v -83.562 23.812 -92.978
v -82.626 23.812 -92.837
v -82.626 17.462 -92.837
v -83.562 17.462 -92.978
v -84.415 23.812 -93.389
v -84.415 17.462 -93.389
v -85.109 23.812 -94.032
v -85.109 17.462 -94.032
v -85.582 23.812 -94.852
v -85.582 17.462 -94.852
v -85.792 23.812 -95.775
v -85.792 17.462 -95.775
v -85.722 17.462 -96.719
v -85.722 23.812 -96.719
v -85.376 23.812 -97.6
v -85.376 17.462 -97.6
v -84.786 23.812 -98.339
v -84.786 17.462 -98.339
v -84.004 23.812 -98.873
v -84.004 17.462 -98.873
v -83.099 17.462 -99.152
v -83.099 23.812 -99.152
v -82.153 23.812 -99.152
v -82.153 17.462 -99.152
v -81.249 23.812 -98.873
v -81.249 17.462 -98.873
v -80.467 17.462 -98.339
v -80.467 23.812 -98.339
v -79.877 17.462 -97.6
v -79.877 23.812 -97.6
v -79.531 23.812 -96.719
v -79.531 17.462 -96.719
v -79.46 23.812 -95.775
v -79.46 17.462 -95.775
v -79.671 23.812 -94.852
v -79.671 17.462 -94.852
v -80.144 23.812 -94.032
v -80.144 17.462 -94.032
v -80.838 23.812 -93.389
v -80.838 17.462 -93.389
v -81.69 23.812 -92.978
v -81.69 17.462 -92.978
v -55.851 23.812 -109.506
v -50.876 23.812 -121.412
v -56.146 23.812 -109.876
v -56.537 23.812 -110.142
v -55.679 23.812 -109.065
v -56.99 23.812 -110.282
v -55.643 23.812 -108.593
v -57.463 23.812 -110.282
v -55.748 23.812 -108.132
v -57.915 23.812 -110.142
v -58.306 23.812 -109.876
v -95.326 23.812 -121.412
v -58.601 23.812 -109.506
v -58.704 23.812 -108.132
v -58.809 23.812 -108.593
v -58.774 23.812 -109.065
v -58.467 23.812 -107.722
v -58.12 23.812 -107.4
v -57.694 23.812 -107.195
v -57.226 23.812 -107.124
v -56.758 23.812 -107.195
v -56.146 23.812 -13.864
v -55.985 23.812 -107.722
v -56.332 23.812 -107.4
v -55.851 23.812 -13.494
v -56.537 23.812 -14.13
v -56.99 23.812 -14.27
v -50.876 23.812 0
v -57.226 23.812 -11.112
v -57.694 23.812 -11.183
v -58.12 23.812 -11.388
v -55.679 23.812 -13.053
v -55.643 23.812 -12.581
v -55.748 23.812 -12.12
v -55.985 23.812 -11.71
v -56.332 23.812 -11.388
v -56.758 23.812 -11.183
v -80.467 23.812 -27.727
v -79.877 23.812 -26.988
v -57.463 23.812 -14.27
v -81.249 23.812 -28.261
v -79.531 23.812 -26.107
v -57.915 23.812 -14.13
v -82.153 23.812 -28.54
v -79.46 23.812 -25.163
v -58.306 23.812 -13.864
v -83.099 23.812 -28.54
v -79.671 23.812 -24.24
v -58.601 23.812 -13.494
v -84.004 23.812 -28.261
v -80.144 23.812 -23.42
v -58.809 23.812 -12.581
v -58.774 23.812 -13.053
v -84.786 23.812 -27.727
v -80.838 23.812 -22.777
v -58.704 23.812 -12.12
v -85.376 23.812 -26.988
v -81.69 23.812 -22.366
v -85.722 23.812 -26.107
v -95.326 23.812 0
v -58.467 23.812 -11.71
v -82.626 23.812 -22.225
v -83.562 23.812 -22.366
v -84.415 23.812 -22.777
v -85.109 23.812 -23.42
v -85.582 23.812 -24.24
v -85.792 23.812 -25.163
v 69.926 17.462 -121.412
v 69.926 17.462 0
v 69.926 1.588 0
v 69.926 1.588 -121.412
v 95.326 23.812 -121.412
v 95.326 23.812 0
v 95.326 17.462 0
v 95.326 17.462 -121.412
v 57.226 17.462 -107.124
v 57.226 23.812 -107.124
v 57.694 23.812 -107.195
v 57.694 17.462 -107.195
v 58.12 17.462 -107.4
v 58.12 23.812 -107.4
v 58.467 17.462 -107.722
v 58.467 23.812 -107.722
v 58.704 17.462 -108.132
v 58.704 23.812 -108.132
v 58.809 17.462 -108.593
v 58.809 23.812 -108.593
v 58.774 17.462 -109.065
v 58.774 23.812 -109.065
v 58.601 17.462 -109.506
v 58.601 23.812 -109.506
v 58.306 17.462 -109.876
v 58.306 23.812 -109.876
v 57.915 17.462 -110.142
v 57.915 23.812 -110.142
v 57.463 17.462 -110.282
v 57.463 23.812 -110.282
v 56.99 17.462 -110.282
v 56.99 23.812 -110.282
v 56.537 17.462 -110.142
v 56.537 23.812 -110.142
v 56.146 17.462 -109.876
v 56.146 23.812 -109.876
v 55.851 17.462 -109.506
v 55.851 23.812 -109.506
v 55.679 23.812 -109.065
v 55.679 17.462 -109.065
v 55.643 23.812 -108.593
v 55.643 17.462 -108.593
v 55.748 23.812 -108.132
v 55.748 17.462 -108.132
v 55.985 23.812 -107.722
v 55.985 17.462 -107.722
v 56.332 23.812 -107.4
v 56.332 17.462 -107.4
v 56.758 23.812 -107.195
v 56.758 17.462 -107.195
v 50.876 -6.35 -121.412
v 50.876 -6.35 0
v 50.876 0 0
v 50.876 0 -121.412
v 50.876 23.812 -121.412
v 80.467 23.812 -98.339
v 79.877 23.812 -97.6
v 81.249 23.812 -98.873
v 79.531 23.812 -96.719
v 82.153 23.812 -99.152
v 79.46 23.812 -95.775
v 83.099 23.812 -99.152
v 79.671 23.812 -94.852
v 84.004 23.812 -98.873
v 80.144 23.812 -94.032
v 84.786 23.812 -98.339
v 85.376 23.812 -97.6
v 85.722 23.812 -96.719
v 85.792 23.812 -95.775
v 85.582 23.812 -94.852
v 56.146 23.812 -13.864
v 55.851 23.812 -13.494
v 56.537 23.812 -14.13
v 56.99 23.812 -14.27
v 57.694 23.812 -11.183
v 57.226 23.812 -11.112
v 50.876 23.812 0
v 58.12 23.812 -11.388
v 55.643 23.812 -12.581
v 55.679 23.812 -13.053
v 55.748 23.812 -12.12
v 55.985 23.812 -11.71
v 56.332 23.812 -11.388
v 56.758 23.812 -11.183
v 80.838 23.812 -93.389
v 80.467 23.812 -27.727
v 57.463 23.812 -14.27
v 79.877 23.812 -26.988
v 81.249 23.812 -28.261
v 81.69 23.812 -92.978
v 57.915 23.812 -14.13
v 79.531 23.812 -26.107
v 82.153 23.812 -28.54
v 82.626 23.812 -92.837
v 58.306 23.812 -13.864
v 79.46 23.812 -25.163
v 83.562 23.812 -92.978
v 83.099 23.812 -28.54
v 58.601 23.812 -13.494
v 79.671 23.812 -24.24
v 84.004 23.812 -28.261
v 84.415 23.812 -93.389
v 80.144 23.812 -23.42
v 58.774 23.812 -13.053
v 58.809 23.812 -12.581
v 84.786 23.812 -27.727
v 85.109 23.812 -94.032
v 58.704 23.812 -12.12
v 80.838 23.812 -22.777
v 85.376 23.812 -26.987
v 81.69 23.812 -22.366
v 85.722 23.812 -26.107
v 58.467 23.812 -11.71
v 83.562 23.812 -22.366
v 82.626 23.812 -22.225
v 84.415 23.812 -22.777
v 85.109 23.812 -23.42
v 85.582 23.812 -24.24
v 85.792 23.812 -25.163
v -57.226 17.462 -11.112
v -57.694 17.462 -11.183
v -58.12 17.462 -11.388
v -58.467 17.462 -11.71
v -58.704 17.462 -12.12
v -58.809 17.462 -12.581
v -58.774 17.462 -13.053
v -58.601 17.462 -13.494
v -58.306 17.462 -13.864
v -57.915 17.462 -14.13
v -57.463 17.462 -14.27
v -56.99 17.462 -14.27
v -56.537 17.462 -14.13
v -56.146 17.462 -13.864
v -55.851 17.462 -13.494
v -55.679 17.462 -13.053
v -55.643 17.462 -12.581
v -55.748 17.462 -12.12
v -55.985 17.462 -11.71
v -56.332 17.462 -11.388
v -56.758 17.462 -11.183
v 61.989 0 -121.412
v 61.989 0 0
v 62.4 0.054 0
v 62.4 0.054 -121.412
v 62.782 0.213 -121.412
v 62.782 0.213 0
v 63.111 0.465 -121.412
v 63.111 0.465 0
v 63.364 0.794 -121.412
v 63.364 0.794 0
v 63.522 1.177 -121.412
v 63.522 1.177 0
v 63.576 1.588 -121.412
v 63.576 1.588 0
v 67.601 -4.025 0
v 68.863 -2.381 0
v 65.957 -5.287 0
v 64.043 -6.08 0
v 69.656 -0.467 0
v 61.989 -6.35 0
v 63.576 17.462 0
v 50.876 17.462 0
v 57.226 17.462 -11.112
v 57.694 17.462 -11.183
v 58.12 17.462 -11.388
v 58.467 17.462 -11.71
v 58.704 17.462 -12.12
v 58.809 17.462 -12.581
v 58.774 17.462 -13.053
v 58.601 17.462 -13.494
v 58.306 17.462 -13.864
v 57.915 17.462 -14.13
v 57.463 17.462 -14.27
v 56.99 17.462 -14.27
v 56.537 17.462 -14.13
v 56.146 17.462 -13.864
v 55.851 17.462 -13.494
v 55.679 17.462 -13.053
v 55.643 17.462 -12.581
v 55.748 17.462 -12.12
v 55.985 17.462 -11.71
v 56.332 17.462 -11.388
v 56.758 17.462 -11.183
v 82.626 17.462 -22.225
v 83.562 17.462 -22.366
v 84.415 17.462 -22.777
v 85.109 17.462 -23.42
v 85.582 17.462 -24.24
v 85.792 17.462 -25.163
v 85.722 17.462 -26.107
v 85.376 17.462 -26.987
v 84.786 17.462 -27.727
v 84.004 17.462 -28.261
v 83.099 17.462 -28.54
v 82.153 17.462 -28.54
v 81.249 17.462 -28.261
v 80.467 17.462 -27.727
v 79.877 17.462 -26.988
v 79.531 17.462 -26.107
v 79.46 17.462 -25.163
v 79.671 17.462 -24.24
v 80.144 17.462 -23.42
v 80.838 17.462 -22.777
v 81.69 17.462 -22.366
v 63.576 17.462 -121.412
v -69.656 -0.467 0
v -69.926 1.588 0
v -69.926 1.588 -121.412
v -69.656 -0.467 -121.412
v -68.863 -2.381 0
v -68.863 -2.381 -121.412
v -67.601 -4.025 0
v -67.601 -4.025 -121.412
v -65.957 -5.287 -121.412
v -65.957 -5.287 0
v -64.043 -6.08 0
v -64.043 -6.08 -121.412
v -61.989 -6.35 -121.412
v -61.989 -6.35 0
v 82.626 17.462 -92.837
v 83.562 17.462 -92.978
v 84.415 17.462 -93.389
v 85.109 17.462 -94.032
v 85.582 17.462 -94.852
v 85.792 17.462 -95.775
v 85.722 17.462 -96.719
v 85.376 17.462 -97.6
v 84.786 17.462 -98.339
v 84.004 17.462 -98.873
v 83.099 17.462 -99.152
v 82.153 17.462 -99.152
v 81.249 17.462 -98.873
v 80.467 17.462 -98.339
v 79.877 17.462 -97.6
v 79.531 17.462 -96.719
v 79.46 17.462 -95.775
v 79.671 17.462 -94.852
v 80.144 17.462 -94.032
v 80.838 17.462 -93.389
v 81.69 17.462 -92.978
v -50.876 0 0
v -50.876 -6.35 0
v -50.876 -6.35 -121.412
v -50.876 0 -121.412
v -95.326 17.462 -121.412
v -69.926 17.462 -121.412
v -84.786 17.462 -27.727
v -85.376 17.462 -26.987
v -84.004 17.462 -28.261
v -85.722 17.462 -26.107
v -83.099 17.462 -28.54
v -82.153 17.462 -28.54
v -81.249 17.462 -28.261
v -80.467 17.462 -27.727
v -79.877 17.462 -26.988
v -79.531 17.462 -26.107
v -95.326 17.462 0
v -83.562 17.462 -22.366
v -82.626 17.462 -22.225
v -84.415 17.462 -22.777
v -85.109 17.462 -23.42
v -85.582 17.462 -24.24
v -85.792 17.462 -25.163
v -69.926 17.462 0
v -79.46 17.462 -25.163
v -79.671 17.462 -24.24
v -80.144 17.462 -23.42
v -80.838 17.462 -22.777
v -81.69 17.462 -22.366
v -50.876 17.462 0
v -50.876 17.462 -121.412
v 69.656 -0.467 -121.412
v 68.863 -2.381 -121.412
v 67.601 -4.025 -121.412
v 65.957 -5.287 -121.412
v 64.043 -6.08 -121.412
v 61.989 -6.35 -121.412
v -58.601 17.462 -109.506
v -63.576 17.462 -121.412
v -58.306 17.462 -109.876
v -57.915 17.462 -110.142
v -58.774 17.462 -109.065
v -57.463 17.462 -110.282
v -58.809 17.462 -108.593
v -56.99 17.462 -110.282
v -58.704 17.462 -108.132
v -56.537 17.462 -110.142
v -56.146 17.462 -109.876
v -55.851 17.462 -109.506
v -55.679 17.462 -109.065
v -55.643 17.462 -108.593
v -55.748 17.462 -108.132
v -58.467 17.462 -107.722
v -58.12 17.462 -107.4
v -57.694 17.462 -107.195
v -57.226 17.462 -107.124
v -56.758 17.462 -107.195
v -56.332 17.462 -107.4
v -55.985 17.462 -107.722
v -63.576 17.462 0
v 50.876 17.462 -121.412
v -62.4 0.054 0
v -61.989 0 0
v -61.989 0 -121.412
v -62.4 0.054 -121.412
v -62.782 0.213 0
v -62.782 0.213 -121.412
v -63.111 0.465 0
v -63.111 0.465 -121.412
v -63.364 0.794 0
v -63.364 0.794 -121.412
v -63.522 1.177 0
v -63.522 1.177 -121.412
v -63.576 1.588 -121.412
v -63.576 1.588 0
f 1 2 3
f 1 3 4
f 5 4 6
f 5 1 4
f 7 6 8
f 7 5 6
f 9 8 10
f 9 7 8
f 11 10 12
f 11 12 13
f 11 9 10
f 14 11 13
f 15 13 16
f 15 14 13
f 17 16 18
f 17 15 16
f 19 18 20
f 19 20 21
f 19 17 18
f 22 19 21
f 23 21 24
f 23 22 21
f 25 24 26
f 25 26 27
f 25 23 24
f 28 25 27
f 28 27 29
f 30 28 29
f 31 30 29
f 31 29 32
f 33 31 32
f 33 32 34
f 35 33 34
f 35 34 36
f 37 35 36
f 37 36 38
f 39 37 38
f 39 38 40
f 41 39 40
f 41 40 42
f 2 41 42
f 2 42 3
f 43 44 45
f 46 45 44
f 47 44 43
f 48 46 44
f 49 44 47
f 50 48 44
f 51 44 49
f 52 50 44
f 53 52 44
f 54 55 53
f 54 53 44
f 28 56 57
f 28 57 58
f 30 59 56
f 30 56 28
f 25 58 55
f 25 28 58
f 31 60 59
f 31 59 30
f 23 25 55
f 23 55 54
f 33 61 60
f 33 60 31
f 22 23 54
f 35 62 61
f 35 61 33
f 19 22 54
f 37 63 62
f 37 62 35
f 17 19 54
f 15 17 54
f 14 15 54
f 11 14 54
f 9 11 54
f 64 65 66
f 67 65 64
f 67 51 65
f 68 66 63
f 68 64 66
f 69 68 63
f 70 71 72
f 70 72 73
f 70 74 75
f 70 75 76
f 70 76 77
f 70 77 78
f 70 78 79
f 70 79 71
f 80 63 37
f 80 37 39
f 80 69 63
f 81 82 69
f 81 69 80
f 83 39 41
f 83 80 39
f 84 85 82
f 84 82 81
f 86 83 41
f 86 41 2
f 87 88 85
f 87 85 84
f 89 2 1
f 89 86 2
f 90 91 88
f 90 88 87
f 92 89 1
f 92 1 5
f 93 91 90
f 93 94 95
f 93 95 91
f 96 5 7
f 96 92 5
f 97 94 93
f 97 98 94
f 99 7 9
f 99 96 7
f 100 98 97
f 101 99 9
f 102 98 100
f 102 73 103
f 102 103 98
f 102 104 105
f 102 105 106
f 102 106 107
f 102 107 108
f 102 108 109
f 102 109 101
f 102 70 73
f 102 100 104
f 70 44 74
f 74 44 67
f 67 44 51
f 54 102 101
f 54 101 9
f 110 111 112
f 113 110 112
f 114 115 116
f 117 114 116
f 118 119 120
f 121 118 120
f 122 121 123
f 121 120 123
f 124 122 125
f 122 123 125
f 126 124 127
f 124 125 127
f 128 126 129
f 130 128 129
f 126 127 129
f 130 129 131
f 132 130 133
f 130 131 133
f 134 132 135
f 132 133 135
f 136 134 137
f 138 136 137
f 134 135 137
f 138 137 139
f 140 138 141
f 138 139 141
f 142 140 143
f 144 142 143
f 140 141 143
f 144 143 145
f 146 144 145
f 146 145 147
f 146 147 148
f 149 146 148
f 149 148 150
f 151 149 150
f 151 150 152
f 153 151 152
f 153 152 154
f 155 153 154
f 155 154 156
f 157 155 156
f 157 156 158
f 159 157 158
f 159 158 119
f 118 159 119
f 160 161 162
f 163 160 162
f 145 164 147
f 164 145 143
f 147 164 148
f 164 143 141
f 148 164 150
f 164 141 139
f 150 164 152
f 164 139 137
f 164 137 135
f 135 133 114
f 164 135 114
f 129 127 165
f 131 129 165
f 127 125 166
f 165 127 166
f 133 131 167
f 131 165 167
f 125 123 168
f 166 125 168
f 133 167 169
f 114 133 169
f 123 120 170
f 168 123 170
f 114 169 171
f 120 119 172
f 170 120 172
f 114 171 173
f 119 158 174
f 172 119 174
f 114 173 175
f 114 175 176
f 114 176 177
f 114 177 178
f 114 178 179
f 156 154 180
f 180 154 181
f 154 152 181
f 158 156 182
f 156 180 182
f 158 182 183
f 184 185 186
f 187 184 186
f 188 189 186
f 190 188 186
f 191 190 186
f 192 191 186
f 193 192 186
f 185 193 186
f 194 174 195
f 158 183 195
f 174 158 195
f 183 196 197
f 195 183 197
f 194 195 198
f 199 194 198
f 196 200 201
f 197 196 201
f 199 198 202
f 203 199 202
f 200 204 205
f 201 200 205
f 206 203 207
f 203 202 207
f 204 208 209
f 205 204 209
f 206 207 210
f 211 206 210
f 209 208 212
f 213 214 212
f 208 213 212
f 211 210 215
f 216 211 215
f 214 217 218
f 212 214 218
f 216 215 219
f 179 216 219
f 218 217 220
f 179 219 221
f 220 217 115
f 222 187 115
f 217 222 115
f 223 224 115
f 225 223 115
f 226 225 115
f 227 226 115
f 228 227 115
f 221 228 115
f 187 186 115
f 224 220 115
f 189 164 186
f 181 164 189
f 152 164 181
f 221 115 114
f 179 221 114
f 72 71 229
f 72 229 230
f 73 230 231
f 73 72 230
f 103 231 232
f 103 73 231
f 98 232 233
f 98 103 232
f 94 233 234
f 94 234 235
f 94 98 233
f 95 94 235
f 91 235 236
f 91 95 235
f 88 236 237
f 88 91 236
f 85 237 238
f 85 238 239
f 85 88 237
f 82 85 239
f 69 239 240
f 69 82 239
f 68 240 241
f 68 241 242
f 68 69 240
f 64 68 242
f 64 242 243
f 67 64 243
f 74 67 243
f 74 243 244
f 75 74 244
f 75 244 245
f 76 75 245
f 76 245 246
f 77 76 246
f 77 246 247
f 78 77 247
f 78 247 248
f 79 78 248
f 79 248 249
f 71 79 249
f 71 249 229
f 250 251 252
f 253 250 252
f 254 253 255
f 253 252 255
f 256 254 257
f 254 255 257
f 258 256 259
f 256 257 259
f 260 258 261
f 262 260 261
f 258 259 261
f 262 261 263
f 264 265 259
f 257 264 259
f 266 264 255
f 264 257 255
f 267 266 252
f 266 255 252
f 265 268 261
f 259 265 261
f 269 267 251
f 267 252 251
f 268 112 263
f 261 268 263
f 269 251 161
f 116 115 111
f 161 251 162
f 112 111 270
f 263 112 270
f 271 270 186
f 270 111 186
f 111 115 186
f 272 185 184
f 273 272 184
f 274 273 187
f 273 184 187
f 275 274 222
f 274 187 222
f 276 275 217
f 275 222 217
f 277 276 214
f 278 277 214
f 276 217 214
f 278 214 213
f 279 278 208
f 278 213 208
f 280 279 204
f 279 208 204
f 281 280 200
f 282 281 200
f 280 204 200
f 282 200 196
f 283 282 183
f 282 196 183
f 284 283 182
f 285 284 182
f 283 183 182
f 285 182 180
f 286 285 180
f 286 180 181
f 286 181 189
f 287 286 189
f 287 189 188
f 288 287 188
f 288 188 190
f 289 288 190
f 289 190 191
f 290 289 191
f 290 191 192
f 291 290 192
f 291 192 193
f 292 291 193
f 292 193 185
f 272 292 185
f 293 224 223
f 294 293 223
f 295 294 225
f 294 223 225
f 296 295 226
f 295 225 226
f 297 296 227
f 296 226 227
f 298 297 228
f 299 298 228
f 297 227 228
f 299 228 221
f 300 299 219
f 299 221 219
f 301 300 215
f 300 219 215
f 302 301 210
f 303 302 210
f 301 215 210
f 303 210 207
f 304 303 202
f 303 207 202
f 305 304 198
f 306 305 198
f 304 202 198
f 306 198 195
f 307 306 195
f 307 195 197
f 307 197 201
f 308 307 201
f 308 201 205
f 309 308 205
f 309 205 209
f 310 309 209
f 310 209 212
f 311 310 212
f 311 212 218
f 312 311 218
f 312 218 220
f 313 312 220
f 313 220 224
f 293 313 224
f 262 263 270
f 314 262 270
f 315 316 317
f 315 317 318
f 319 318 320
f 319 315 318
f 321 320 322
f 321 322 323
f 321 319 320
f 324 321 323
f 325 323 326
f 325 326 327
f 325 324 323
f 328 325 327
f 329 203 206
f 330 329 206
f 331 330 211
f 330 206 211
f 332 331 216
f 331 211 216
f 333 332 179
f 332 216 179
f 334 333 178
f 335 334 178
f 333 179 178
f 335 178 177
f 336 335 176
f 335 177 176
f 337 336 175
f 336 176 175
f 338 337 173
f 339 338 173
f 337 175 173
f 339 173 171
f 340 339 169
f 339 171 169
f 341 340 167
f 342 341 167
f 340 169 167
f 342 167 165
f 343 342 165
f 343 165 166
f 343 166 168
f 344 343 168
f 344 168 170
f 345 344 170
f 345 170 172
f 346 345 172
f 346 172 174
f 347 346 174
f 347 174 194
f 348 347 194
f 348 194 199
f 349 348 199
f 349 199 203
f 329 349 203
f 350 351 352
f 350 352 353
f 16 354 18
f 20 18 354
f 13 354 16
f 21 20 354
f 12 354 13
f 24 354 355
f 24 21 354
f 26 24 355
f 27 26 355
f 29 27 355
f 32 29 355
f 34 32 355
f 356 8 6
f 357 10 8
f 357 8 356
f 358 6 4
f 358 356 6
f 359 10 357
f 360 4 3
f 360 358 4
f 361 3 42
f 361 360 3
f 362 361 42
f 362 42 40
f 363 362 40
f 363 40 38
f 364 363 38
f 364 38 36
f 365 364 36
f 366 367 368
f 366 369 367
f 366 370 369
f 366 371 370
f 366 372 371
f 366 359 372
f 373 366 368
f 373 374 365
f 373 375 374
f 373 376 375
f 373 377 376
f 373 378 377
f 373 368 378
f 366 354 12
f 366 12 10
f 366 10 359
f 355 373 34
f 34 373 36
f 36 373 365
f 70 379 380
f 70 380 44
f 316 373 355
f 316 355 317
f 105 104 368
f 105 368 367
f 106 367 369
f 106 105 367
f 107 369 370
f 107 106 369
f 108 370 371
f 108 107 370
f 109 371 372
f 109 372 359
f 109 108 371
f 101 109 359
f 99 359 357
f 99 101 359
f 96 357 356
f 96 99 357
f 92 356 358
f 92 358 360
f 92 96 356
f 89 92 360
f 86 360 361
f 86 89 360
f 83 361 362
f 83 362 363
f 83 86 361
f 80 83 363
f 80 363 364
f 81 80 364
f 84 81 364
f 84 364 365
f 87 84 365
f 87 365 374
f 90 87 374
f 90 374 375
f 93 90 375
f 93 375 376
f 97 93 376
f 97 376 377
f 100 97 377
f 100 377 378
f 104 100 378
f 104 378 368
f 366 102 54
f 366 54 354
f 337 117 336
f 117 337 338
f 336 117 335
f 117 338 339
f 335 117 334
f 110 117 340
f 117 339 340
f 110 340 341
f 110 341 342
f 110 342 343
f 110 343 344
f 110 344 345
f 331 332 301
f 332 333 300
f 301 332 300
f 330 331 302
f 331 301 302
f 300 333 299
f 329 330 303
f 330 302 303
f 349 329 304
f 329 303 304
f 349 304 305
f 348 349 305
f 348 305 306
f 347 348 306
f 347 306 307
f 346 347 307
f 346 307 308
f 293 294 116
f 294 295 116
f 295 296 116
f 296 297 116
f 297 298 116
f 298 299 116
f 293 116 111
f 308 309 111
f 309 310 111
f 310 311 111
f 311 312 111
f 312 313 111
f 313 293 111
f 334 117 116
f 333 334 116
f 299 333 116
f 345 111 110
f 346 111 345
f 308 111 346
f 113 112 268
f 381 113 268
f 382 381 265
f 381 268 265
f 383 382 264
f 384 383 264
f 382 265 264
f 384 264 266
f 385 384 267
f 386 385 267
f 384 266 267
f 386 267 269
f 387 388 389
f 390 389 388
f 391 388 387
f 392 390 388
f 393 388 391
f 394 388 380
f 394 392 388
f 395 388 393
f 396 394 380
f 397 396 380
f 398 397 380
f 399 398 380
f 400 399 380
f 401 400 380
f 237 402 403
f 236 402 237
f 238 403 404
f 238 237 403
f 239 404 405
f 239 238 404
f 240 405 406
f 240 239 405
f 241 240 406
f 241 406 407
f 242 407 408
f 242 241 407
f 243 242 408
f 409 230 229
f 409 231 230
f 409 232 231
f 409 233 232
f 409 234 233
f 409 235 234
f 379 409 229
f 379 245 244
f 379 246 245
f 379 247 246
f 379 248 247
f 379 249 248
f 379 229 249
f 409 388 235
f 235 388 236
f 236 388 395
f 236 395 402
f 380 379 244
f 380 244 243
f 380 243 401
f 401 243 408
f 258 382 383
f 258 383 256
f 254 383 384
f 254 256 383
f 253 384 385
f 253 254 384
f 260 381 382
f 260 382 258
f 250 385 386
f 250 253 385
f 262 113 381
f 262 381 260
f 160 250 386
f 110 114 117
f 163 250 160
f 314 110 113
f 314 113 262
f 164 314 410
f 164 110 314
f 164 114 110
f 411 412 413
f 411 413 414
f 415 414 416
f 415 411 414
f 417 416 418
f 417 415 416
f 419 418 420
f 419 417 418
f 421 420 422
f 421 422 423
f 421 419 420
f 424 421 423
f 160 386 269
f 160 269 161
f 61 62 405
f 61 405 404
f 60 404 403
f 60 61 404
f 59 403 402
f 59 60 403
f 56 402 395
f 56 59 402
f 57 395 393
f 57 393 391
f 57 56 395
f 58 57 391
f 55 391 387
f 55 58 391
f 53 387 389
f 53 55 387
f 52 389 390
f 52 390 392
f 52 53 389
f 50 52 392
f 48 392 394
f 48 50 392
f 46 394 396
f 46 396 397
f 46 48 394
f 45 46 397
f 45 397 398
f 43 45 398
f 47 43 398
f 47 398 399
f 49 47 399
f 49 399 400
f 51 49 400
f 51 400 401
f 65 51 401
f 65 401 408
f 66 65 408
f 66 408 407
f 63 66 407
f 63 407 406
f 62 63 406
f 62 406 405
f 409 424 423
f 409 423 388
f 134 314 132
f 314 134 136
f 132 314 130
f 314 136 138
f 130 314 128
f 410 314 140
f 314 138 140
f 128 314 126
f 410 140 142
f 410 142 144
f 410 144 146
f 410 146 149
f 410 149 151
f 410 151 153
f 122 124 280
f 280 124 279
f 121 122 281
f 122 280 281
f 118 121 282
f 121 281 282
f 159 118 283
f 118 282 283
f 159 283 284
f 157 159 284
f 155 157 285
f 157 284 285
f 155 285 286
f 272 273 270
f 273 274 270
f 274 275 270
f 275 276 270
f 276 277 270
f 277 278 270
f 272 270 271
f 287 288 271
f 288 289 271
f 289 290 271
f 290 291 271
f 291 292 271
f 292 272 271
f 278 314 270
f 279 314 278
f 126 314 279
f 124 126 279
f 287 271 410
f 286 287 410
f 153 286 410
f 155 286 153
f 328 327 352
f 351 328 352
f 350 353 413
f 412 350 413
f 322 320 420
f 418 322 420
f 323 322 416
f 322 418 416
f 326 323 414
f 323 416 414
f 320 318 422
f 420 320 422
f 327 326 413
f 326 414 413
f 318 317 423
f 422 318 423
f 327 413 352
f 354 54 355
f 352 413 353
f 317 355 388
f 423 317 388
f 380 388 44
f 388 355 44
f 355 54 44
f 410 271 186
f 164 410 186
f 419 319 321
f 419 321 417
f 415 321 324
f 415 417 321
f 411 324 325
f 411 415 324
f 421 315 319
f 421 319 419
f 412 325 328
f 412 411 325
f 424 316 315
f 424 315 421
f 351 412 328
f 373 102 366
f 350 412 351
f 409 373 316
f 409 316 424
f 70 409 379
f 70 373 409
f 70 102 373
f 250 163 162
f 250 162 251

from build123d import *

# Parameters (mm, degrees)
BOSS_EXTRUDE2_DEPTH = 121.412
CUT_EXTRUDE1_REACH  = 159.282
SKETCH2_R           = 1.5875
SKETCH2_R_2         = 3.175


with BuildPart() as part:
    # Sketch1 → Boss-Extrude2 (new body)
    with BuildSketch(Plane.XY):
        with BuildLine():
            ThreePointArc((61.9887, 0), (63.111232015, 0.464967985), (63.5762, 1.5875))
            Line((63.5762, 1.5875), (63.5762, 17.4625))
            Line((63.5762, 17.4625), (50.8762, 17.4625))
            Line((50.8762, 17.4625), (50.8762, 23.8125))
            Line((50.8762, 23.8125), (95.3262, 23.8125))
            Line((95.3262, 23.8125), (95.3262, 17.4625))
            Line((95.3262, 17.4625), (69.9262, 17.4625))
            Line((69.9262, 17.4625), (69.9262, 1.5875))
            ThreePointArc((69.9262, 1.5875), (67.601360076, -4.025160076), (61.9887, -6.35))
            Line((61.9887, -6.35), (50.8762, -6.35))
            Line((50.8762, -6.35), (50.8762, 0))
            Line((50.8762, 0), (61.9887, 0))
        make_face()
    extrude(amount=-BOSS_EXTRUDE2_DEPTH)

    # Sketch2 → Cut-Extrude1 (cut, up to next)
    with BuildSketch(Plane(origin=(0, 23.8125, 0), x_dir=(1, 0, 0), z_dir=(0, 1, 0)), mode=Mode.PRIVATE) as cut_extrude1_sk1:
        with Locations(Location((57.2262, 108.712, 0), (0, 0, 270))):
            Circle(SKETCH2_R)
    cut_extrude1_tool1 = extrude(cut_extrude1_sk1.sketch, amount=-CUT_EXTRUDE1_REACH, mode=Mode.PRIVATE) & part.part
    # Sketch2 → Cut-Extrude1 (cut, up to next)
    with BuildSketch(Plane(origin=(0, 23.8125, 0), x_dir=(1, 0, 0), z_dir=(0, 1, 0)), mode=Mode.PRIVATE) as cut_extrude1_sk2:
        with Locations(Location((57.2262, 12.7, 0), (0, 0, 270))):
            Circle(SKETCH2_R)
    cut_extrude1_tool2 = extrude(cut_extrude1_sk2.sketch, amount=-CUT_EXTRUDE1_REACH, mode=Mode.PRIVATE) & part.part
    # Sketch2 → Cut-Extrude1 (cut, up to next)
    with BuildSketch(Plane(origin=(0, 23.8125, 0), x_dir=(1, 0, 0), z_dir=(0, 1, 0)), mode=Mode.PRIVATE) as cut_extrude1_sk3:
        with Locations(Location((82.6262, 96.012, 0), (0, 0, 270))):
            Circle(SKETCH2_R_2)
    cut_extrude1_tool3 = extrude(cut_extrude1_sk3.sketch, amount=-CUT_EXTRUDE1_REACH, mode=Mode.PRIVATE) & part.part
    # Sketch2 → Cut-Extrude1 (cut, up to next)
    with BuildSketch(Plane(origin=(0, 23.8125, 0), x_dir=(1, 0, 0), z_dir=(0, 1, 0)), mode=Mode.PRIVATE) as cut_extrude1_sk4:
        with Locations(Location((82.6262, 25.4, 0), (0, 0, 270))):
            Circle(SKETCH2_R_2)
    cut_extrude1_tool4 = extrude(cut_extrude1_sk4.sketch, amount=-CUT_EXTRUDE1_REACH, mode=Mode.PRIVATE) & part.part
    add(cut_extrude1_tool1.solids().sort_by_distance((57.2262, 23.8125, -108.712))[0], mode=Mode.SUBTRACT)
    add(cut_extrude1_tool2.solids().sort_by_distance((57.2262, 23.8125, -12.7))[0], mode=Mode.SUBTRACT)
    add(cut_extrude1_tool3.solids().sort_by_distance((82.6262, 23.8125, -96.012))[0], mode=Mode.SUBTRACT)
    add(cut_extrude1_tool4.solids().sort_by_distance((82.6262, 23.8125, -25.4))[0], mode=Mode.SUBTRACT)


with BuildPart() as body_2:
    # Mirror5: mirrored copy
    add(part.part.mirror(Plane.ZY))


solid = Compound([part.part, body_2.part])
